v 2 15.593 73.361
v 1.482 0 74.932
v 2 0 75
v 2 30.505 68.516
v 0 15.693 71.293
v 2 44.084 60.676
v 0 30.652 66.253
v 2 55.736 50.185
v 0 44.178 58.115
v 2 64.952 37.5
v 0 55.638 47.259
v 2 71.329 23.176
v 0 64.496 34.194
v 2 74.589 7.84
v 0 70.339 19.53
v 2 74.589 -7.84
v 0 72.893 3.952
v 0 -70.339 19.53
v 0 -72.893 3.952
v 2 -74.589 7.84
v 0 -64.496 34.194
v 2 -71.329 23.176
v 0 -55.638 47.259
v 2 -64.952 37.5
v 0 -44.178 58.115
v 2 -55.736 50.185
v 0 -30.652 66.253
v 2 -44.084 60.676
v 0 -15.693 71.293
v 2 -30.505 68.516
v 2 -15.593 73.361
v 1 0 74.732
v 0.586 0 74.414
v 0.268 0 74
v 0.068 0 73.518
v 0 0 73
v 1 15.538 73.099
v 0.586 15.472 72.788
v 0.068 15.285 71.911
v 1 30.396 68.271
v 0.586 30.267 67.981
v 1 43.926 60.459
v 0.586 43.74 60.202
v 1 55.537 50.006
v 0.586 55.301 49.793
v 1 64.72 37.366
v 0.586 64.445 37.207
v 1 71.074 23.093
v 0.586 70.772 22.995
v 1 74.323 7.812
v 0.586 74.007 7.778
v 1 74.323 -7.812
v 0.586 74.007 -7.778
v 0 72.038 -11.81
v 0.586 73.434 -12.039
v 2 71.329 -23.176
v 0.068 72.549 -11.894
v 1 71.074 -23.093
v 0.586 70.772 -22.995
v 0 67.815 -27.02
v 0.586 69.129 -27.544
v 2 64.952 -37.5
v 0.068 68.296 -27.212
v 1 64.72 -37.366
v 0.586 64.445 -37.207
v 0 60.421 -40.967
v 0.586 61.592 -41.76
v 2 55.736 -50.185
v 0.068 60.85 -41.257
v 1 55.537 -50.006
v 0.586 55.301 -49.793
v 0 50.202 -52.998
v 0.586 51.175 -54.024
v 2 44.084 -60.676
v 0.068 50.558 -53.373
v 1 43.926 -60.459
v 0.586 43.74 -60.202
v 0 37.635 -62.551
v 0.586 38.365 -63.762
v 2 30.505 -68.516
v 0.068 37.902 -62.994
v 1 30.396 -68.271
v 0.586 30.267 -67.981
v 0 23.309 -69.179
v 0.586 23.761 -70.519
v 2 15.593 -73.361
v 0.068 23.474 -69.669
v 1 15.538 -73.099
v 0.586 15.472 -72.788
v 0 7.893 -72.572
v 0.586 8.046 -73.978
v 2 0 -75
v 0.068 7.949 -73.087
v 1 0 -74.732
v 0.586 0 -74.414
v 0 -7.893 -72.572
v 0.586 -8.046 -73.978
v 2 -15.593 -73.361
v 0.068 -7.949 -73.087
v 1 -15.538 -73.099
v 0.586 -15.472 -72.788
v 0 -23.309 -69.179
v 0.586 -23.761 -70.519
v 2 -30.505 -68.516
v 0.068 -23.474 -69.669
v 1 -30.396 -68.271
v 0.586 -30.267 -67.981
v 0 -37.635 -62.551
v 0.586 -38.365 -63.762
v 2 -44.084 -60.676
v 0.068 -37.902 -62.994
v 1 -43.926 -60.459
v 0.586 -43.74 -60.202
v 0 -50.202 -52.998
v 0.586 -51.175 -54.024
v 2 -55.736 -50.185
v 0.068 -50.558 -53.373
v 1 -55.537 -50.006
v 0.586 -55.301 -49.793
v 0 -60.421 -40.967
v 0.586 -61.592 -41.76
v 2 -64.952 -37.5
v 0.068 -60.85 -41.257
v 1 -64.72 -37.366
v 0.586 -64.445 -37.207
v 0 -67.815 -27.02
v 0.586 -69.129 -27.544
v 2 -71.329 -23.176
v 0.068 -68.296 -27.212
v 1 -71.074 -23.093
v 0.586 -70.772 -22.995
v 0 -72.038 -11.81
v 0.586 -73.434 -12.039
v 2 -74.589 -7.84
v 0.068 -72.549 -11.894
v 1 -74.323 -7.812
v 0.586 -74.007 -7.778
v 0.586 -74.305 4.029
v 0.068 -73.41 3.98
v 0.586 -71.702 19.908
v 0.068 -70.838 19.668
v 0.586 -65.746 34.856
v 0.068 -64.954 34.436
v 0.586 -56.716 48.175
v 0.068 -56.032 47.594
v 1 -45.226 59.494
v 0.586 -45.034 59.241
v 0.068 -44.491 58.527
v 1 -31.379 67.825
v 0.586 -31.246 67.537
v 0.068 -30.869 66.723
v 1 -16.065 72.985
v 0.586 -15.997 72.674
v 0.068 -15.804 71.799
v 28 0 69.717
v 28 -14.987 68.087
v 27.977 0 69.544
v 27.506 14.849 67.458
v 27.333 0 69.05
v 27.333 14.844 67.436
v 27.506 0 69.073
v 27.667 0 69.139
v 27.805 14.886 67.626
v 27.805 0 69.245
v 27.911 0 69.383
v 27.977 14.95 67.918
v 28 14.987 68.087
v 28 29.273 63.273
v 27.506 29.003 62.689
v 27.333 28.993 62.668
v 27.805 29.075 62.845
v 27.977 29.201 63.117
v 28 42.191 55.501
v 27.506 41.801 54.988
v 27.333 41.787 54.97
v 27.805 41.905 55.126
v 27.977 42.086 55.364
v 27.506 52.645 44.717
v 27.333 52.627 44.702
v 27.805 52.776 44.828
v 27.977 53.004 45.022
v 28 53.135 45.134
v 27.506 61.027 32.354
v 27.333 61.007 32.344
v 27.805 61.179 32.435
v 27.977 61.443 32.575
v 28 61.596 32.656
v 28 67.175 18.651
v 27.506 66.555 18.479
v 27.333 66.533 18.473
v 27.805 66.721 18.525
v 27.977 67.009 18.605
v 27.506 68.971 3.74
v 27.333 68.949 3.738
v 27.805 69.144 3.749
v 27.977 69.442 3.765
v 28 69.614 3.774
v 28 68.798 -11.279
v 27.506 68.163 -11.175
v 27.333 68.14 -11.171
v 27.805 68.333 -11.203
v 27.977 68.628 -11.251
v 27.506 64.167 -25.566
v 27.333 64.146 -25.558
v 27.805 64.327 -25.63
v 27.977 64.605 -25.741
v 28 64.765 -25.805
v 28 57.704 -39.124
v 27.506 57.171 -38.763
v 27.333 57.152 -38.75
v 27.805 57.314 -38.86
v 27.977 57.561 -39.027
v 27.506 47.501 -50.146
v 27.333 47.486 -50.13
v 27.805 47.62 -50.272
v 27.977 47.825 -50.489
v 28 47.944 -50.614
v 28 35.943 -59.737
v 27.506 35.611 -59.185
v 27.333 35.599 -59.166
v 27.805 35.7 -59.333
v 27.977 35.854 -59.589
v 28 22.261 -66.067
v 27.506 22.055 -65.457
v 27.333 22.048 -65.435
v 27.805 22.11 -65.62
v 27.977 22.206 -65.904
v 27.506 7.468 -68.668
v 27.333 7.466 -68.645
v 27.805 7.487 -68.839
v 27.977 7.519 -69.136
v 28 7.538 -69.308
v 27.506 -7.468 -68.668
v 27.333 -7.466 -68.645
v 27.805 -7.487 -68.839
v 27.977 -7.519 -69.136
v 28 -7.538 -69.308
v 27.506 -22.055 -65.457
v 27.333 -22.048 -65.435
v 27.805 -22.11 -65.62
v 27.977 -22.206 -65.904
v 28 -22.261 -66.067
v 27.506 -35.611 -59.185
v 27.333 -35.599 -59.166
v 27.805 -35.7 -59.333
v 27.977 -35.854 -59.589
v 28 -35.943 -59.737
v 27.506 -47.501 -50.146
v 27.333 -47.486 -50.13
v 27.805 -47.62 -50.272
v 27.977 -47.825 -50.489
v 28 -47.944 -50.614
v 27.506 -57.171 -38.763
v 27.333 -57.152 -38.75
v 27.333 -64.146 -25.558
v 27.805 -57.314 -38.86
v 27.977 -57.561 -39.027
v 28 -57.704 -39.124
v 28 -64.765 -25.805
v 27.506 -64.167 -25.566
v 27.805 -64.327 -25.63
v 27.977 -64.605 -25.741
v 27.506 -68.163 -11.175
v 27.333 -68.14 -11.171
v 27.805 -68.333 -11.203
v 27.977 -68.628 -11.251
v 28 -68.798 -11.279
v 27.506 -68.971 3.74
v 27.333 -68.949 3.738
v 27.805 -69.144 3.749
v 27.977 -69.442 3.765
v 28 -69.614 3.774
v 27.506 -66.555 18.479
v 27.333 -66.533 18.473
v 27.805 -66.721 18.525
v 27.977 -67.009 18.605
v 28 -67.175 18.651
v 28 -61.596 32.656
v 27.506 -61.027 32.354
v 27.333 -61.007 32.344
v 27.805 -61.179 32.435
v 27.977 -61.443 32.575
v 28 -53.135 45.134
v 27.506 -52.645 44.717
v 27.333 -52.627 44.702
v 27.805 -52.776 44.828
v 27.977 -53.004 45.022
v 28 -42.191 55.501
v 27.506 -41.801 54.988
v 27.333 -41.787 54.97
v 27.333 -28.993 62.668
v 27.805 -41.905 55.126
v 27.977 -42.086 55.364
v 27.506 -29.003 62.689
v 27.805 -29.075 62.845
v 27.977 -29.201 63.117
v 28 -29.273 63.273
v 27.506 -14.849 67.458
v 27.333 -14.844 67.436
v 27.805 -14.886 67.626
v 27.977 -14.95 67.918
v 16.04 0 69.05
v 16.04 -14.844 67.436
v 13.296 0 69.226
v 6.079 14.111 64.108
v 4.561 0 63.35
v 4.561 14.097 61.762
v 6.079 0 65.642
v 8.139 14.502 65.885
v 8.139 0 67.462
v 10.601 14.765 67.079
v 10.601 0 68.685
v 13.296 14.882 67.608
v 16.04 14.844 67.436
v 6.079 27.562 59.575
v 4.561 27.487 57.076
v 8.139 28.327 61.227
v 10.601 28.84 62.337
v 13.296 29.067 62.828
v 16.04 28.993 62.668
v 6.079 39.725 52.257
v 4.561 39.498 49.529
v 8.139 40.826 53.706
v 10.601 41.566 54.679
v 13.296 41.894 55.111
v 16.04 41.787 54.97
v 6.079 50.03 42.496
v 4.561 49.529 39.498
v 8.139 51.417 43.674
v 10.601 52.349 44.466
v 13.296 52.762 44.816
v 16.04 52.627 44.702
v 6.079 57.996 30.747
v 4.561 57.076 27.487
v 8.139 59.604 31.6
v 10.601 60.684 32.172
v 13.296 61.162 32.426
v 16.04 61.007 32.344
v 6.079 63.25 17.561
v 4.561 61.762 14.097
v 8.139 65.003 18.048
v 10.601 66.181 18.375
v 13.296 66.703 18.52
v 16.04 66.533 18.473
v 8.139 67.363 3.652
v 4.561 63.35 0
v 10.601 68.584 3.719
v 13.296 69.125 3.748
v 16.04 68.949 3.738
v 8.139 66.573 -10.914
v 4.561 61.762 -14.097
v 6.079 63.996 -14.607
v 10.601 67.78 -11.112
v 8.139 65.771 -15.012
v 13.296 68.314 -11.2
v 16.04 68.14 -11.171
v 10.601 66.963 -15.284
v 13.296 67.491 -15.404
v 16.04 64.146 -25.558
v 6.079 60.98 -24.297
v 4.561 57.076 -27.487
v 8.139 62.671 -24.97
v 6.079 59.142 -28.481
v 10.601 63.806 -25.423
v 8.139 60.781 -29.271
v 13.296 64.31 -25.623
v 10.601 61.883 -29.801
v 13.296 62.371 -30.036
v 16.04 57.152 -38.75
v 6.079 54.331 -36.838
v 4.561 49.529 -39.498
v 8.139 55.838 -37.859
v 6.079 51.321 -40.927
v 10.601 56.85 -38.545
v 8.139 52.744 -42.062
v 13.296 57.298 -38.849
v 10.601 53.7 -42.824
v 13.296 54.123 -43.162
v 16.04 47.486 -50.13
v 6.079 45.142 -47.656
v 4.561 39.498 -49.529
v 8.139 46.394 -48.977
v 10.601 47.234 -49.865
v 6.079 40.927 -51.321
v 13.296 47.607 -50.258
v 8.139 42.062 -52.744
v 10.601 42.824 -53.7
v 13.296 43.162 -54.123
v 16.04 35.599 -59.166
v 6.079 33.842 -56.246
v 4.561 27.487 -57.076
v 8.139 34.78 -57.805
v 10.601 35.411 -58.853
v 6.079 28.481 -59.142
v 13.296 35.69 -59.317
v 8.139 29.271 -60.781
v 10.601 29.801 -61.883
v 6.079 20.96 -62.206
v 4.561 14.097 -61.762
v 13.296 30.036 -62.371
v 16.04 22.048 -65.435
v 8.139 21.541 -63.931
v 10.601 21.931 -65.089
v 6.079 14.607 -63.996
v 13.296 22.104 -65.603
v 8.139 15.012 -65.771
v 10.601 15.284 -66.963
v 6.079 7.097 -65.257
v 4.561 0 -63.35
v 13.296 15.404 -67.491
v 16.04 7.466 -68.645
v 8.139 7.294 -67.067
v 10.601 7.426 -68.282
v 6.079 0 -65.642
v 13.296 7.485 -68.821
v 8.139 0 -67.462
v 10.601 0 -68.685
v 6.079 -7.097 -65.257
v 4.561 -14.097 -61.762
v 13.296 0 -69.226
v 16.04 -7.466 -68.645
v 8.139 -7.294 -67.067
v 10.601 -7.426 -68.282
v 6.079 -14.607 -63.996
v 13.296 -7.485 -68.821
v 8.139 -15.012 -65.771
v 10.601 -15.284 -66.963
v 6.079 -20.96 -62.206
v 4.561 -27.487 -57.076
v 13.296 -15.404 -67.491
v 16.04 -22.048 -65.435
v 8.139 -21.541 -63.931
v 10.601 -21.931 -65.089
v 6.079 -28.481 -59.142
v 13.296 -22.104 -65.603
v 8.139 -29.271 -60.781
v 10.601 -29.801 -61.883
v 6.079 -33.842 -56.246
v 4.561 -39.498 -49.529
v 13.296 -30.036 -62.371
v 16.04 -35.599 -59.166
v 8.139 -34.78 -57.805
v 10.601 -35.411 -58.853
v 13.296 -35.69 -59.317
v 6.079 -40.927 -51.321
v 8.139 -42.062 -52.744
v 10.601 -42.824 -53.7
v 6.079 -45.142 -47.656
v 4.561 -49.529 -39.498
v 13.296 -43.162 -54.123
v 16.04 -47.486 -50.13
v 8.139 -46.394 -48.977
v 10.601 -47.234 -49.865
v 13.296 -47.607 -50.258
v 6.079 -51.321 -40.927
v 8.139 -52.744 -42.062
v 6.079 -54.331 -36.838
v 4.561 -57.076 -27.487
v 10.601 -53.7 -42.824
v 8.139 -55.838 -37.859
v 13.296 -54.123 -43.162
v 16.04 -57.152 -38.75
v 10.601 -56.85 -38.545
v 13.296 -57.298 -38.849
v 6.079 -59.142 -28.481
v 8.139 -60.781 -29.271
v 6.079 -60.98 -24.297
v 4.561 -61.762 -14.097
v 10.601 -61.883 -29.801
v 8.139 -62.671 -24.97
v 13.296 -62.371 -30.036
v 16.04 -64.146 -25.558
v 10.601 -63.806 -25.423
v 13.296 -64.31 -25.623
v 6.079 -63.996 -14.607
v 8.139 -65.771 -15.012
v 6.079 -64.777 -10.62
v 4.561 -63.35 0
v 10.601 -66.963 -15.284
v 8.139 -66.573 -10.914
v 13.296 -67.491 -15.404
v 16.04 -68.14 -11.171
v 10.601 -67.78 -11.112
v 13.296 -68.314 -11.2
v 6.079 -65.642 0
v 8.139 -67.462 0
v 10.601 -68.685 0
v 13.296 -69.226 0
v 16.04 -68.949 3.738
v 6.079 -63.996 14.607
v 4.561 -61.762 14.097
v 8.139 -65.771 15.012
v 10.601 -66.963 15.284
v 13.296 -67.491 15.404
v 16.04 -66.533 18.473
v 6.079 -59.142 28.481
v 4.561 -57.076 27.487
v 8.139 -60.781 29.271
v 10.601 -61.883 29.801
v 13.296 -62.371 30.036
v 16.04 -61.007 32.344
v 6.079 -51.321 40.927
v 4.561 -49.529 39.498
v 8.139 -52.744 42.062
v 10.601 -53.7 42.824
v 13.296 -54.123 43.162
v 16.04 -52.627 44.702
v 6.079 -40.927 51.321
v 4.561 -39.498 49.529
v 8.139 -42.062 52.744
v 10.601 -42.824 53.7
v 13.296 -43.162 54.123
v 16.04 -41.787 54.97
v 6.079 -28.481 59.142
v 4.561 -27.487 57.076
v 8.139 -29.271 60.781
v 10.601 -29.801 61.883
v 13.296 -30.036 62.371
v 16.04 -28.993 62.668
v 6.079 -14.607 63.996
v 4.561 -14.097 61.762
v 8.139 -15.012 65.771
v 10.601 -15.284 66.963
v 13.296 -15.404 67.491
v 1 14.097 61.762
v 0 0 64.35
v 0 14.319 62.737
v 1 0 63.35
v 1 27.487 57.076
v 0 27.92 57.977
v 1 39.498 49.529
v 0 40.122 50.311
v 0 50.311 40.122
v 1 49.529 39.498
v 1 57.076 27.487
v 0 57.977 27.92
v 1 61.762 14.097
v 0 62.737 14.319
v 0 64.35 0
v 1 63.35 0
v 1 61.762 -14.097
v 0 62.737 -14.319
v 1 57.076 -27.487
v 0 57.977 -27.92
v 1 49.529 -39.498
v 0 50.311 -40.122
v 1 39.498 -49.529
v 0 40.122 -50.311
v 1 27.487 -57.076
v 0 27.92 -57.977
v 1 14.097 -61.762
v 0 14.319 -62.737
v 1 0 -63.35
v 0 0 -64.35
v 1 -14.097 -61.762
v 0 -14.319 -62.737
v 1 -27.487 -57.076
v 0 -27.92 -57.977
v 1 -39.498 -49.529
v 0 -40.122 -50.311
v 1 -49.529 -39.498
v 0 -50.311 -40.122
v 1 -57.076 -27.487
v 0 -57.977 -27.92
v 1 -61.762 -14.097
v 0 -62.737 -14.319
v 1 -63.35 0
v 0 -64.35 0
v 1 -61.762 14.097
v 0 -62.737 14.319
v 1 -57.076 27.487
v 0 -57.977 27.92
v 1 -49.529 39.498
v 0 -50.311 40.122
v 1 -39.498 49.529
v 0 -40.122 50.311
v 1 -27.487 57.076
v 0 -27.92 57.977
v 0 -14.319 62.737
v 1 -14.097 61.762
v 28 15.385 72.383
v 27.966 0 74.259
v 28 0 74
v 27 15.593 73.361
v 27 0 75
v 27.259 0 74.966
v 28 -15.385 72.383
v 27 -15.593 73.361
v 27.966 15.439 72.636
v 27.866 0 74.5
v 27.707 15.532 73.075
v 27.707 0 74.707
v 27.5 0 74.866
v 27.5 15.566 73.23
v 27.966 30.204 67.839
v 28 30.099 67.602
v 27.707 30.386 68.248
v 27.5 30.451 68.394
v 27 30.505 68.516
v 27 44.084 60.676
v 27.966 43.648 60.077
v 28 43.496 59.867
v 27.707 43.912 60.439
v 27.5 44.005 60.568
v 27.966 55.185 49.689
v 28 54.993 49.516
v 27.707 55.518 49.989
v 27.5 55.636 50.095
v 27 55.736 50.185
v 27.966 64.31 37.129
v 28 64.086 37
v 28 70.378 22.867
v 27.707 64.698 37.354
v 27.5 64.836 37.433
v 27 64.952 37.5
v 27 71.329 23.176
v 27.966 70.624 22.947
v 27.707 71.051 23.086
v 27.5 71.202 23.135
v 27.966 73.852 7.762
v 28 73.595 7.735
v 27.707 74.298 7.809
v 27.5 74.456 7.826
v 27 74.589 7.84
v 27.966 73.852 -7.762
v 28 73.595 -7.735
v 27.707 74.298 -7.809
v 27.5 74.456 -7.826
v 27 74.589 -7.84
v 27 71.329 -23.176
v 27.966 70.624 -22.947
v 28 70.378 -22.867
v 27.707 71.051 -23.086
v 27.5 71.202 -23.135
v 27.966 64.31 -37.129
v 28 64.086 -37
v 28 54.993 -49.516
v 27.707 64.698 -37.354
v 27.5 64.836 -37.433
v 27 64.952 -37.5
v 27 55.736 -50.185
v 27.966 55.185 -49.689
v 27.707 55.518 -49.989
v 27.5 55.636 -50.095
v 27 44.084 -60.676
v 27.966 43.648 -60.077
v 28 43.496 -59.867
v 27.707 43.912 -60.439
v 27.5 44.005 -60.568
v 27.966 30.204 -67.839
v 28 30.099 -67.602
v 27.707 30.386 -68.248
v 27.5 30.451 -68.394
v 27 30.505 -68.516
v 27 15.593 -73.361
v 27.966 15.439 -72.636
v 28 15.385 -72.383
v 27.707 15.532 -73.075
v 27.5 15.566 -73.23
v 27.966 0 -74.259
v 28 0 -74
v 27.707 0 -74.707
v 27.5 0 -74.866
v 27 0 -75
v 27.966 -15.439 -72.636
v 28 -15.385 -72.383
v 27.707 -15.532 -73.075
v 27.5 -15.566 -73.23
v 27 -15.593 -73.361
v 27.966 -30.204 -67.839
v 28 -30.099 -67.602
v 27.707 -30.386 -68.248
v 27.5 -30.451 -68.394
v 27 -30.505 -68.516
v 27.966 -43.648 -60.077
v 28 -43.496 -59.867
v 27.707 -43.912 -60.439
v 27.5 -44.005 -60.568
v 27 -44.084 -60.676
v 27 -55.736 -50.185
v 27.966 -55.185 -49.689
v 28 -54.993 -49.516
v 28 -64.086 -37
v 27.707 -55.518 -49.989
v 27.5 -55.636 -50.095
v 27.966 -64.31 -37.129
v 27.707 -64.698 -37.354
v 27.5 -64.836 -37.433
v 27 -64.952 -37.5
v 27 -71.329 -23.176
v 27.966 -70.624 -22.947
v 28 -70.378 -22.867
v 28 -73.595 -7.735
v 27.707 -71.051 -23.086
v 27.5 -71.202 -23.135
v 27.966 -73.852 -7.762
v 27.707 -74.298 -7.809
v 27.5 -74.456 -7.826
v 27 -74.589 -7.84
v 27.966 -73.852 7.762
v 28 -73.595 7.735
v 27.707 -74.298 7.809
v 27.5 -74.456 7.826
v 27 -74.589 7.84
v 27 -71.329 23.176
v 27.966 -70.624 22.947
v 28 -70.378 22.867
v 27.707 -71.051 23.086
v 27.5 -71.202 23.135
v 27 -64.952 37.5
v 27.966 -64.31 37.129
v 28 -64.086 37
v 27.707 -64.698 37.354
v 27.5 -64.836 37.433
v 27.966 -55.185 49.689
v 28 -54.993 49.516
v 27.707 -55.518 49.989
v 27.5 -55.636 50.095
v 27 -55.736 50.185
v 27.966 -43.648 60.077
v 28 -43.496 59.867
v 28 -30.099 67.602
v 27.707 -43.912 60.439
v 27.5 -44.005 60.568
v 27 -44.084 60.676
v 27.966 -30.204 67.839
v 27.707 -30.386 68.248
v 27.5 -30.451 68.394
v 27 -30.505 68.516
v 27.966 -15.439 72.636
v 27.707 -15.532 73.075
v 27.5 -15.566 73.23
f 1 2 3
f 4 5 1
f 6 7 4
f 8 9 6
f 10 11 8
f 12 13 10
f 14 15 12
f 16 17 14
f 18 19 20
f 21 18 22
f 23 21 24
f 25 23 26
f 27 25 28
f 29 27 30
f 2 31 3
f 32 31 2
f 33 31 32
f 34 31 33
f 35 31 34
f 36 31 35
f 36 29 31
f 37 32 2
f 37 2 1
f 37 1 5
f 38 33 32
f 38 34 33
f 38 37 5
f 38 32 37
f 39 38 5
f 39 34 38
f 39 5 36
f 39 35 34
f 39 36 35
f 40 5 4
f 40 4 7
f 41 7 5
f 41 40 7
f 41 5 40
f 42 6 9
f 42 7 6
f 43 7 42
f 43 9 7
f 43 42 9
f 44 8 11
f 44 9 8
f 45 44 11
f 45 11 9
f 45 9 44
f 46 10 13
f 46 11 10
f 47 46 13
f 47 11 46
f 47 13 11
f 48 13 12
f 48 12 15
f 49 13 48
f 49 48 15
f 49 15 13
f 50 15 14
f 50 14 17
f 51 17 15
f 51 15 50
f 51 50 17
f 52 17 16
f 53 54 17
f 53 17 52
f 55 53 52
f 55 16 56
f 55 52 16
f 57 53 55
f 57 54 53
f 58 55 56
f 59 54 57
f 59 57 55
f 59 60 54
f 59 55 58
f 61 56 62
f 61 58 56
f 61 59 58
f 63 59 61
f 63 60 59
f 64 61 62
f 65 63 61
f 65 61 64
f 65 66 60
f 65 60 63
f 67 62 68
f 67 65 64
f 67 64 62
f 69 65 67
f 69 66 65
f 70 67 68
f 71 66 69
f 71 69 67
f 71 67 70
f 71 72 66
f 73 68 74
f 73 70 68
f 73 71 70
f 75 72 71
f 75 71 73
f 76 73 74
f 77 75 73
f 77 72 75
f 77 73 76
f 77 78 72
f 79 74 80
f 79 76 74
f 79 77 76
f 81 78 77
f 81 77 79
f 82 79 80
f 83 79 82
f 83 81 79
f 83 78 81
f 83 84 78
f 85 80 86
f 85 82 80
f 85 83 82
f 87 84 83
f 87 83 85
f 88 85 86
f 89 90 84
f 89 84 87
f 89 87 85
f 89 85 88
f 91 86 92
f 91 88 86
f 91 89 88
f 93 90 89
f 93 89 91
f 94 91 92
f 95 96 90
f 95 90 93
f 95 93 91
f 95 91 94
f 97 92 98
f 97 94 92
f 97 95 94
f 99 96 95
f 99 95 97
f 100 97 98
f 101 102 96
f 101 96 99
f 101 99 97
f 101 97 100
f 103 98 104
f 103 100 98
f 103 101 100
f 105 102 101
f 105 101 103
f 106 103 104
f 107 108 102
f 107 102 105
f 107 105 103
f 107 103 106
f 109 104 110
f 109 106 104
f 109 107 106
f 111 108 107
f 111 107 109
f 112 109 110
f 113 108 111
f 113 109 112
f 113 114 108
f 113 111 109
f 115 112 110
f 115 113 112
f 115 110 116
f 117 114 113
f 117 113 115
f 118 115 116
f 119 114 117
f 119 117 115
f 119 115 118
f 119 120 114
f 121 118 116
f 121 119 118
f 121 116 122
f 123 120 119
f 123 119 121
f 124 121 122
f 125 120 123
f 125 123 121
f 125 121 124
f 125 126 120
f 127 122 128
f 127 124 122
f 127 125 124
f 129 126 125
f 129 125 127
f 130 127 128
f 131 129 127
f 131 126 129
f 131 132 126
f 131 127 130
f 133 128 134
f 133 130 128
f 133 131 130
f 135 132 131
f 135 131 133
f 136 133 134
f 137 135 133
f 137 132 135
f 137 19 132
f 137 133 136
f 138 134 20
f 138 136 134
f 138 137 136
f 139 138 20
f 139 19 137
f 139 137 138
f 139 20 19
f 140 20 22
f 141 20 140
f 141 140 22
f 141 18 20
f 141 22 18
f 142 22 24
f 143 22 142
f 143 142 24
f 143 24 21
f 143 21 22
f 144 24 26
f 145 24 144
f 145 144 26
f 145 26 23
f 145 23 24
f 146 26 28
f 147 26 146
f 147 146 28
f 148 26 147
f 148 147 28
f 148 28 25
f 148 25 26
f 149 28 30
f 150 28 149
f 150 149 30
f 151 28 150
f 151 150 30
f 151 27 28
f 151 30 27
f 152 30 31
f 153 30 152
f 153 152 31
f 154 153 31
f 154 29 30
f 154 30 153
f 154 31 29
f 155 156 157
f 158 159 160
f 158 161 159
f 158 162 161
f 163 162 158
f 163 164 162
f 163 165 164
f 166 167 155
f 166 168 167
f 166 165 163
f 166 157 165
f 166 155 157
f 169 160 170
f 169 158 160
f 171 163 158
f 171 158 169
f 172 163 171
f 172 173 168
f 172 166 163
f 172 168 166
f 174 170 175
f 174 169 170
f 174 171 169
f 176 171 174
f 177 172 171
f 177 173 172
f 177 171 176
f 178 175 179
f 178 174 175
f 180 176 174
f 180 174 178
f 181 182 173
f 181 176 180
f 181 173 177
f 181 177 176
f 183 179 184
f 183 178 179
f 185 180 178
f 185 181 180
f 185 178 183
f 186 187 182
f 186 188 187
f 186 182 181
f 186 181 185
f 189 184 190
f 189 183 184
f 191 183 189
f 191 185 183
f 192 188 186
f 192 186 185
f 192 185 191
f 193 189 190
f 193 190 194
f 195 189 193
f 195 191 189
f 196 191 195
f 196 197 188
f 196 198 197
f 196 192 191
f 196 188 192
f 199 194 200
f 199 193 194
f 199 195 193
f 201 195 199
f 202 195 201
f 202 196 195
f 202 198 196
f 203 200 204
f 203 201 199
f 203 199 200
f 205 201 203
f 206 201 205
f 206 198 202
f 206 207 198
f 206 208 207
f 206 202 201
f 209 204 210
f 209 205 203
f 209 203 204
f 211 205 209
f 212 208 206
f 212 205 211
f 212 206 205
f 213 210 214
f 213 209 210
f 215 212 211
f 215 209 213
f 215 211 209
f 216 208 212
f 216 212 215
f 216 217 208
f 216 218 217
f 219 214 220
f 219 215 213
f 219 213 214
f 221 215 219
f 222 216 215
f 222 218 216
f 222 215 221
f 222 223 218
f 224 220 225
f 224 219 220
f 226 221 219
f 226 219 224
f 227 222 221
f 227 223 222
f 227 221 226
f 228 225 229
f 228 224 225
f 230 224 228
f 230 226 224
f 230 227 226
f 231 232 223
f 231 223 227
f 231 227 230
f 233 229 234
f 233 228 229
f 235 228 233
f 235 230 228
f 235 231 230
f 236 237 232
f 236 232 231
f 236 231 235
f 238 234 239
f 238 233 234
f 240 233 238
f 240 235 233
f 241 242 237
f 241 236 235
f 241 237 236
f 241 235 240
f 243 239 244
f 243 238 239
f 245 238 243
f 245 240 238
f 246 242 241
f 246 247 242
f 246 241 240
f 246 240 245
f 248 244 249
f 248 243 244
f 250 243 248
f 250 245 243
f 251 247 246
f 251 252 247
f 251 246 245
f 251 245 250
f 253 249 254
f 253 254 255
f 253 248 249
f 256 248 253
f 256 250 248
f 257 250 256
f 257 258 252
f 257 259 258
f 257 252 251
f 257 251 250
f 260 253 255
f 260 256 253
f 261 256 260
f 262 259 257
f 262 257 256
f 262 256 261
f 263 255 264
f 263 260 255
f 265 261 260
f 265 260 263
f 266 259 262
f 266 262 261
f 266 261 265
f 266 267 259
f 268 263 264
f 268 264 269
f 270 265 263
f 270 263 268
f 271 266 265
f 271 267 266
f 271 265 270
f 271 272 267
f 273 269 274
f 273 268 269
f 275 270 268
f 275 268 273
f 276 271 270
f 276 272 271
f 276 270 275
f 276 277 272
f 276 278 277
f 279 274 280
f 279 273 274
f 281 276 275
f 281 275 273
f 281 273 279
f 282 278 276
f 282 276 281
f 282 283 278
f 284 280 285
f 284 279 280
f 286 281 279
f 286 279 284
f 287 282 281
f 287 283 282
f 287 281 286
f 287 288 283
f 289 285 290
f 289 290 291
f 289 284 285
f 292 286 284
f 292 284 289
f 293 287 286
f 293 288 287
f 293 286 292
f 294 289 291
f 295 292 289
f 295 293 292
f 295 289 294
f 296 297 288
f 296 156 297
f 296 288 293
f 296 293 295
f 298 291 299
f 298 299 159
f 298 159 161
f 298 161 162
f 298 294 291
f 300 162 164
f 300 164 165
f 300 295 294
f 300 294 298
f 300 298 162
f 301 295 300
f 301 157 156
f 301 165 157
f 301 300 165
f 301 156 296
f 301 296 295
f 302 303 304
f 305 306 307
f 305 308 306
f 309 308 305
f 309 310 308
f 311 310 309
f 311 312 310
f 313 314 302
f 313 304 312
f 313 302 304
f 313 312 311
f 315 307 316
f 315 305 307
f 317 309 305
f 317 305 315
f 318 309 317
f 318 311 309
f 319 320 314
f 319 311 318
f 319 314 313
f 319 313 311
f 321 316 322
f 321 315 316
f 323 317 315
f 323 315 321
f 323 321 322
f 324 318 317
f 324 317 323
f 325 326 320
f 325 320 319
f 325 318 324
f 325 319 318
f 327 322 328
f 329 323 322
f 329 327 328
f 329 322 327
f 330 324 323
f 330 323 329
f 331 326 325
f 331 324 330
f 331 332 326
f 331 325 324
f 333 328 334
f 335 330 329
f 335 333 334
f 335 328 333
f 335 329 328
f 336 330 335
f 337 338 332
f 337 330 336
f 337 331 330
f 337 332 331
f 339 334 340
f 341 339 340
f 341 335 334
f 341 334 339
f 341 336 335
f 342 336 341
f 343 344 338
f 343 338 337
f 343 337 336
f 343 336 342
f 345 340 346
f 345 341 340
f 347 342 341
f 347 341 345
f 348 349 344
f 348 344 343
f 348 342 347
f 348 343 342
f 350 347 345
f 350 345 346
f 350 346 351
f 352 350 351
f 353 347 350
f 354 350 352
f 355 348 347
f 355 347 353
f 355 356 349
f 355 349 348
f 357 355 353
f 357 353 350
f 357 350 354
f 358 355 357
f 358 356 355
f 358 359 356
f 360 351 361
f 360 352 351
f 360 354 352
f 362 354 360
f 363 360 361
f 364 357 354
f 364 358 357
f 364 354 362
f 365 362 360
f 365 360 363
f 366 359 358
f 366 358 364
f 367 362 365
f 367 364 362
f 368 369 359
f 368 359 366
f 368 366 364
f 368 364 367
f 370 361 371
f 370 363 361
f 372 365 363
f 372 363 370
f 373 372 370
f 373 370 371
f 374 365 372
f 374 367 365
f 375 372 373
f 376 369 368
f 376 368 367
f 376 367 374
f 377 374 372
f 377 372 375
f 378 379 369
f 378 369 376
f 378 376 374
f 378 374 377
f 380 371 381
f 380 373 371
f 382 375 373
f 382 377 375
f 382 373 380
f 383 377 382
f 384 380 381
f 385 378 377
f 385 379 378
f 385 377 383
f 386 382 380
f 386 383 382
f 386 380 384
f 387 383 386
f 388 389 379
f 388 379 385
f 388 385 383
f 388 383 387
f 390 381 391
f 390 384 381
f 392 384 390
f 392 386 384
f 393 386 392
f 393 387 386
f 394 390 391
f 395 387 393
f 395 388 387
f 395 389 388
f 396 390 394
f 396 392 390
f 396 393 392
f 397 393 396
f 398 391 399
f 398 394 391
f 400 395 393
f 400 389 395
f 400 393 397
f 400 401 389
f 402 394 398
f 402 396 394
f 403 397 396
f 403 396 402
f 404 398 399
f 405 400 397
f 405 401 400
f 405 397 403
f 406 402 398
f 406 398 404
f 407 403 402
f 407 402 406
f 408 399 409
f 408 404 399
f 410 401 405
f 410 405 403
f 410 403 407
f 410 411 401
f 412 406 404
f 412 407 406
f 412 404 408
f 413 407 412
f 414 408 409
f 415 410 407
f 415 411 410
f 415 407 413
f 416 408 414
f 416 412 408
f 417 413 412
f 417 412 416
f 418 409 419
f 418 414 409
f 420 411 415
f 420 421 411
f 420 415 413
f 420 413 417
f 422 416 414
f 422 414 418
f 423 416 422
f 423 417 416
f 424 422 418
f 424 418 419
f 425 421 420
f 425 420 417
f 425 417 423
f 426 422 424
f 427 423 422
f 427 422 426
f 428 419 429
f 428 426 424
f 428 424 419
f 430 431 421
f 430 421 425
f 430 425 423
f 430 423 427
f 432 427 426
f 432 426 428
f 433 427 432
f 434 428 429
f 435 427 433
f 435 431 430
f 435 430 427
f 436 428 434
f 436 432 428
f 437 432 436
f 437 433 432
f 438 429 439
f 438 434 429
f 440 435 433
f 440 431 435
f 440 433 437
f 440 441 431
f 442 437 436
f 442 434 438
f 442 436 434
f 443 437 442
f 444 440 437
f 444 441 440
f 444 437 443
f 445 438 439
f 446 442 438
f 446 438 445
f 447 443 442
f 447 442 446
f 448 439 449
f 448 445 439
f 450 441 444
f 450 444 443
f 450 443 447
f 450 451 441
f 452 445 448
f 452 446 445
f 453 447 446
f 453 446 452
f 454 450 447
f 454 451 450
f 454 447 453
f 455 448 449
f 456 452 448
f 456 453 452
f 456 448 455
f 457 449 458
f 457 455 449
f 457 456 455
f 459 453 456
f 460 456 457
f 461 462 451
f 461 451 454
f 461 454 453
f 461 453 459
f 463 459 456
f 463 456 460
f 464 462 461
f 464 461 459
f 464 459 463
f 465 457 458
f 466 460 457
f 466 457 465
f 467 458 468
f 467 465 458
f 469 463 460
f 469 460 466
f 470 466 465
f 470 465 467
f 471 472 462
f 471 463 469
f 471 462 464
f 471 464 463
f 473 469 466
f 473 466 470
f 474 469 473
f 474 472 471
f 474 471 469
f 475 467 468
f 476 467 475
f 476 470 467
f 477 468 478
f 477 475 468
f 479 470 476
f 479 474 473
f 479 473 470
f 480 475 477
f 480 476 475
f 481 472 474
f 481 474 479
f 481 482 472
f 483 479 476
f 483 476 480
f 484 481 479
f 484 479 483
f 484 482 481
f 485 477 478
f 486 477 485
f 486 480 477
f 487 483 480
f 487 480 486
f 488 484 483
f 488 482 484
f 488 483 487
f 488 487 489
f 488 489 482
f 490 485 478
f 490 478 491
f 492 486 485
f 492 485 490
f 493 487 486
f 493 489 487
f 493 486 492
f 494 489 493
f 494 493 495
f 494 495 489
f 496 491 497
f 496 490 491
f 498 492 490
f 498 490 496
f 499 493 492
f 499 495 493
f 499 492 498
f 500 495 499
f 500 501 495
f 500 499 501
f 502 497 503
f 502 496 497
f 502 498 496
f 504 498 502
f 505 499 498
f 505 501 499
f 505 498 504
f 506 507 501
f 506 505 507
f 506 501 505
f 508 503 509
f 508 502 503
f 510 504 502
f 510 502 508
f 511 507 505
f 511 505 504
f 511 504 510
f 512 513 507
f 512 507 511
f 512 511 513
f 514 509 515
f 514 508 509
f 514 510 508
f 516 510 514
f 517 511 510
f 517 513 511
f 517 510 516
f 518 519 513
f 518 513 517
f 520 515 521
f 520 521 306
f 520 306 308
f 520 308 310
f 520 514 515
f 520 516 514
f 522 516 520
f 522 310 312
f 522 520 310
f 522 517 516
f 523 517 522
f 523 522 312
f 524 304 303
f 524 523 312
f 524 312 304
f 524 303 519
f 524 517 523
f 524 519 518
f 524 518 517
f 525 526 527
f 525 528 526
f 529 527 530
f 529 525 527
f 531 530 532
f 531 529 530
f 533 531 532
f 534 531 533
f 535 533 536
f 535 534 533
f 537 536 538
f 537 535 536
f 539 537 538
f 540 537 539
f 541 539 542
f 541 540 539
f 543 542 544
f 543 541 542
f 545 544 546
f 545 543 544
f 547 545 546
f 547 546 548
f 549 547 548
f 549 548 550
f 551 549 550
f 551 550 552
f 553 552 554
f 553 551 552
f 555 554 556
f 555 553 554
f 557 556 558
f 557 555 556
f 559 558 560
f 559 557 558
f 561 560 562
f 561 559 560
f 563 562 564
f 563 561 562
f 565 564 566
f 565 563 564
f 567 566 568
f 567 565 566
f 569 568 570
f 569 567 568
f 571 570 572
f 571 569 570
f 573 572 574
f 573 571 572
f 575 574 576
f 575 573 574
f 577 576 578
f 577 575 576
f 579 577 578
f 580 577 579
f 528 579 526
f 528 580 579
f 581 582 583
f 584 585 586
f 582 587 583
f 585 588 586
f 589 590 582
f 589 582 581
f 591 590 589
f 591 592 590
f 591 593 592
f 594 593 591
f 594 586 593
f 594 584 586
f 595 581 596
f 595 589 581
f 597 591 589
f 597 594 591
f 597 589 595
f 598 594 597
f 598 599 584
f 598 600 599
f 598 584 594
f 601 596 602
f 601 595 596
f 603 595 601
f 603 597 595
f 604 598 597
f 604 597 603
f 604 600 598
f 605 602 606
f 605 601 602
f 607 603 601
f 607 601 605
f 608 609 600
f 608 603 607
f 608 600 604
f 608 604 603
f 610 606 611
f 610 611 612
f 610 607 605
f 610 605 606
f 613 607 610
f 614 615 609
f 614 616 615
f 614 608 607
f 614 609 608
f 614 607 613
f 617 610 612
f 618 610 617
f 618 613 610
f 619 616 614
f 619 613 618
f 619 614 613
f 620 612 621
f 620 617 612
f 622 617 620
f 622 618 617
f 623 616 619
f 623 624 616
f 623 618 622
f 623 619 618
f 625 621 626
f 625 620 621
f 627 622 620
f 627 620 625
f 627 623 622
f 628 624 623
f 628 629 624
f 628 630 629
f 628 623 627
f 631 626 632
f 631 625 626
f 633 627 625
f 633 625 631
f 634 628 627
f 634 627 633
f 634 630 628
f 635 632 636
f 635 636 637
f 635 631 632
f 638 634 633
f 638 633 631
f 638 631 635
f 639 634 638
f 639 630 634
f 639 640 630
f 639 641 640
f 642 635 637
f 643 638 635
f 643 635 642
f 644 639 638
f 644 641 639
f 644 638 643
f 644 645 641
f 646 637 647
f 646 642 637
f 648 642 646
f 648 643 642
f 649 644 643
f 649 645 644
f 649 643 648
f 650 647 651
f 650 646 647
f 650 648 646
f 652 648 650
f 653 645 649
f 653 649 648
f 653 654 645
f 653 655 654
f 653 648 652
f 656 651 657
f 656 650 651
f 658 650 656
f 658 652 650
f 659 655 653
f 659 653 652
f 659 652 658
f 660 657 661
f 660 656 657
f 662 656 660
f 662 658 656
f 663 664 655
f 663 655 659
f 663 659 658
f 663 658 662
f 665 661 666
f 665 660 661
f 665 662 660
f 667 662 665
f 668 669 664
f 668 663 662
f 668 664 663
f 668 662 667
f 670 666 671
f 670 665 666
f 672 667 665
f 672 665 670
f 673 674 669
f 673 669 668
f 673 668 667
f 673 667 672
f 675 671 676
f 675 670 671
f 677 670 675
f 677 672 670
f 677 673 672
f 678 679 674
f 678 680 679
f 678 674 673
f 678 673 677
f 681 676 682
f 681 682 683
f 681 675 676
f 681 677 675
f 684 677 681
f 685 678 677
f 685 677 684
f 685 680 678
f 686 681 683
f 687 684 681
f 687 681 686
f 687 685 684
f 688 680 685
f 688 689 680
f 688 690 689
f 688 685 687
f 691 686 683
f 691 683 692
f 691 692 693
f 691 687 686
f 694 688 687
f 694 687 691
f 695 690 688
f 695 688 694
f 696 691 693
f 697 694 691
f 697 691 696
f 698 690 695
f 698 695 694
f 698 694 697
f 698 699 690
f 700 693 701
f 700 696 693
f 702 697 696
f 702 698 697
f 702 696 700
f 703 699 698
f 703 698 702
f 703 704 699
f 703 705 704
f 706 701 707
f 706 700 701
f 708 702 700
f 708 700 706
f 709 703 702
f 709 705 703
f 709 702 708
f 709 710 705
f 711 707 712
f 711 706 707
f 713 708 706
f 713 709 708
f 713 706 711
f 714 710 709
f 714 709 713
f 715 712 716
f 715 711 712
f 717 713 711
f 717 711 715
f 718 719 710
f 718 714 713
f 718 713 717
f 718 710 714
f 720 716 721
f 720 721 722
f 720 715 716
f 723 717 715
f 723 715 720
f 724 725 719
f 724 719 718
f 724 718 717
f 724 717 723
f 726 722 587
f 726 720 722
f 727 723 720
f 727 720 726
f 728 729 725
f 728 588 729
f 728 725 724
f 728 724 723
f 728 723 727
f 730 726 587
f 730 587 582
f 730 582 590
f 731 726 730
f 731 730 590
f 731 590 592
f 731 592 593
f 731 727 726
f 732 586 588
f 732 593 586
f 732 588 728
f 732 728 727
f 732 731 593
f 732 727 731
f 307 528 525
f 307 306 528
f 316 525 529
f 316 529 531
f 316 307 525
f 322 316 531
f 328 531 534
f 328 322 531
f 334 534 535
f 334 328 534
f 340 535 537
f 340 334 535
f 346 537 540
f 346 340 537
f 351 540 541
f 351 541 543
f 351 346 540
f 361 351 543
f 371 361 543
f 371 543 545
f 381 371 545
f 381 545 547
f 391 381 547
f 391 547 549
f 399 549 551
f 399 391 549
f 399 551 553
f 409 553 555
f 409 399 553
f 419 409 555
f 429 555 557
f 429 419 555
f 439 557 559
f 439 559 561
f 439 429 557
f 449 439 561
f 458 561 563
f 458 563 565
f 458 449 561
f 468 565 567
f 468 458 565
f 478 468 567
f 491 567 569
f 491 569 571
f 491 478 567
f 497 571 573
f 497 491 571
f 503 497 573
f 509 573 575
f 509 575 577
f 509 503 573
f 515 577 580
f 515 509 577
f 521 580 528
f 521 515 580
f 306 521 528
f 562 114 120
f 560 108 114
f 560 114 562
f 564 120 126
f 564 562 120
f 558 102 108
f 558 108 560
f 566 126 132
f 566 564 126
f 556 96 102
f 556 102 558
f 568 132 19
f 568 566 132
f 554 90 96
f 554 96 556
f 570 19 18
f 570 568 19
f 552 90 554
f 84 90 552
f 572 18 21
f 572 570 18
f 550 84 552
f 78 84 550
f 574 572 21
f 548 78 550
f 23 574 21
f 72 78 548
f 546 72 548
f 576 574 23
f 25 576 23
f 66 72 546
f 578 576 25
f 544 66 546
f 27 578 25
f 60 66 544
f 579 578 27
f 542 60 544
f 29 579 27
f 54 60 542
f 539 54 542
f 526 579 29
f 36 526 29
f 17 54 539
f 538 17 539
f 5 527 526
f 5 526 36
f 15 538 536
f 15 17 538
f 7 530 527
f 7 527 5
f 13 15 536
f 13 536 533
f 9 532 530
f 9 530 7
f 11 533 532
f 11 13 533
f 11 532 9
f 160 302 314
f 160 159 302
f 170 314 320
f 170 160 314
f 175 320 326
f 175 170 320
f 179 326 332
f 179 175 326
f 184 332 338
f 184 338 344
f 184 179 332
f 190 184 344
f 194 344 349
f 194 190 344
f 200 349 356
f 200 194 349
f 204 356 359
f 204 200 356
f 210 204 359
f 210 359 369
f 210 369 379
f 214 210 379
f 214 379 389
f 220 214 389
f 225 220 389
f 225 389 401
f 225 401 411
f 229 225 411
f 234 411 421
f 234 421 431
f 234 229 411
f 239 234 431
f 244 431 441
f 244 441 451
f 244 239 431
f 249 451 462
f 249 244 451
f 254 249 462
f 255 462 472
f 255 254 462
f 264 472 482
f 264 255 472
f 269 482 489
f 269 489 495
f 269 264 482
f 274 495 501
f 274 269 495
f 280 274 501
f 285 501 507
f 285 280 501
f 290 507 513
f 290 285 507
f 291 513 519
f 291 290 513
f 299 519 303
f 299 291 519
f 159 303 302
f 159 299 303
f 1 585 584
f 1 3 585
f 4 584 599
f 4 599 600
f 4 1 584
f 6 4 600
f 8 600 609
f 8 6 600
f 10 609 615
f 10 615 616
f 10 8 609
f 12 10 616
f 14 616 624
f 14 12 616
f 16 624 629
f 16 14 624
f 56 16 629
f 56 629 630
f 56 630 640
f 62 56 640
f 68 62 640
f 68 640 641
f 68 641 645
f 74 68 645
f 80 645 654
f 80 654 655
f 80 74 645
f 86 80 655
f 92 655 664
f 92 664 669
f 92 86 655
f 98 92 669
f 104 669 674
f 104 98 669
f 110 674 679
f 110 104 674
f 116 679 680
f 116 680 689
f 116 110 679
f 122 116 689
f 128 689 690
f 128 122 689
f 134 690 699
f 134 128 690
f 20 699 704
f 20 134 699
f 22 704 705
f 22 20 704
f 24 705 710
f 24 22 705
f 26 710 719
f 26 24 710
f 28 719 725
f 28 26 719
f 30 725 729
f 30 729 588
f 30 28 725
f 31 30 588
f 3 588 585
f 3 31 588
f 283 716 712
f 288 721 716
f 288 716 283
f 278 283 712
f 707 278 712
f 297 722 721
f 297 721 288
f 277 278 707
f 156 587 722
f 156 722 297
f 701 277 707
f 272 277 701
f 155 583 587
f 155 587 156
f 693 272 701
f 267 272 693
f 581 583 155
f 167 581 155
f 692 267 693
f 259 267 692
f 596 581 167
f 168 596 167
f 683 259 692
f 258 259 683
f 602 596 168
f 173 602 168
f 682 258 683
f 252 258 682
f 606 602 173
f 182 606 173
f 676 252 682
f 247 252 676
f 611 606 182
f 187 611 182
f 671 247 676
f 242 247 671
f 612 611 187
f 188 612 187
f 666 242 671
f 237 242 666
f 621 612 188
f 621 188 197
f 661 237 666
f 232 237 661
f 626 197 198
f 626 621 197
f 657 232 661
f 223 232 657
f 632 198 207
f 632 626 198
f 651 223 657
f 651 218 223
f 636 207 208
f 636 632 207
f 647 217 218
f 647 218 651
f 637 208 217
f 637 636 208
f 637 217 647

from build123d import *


with BuildPart() as part:
    # Schizzo1 → Rivoluzione1 (revolve)
    with BuildSketch(Plane.XY, mode=Mode.PRIVATE) as rivoluzione1_sk:
        with BuildLine():
            Line((0, 64.35), (1, 63.35))
            Line((1, 63.35), (4.561250083, 63.35))
            ThreePointArc((4.561250083, 63.35), (9.32995439, 68.154290191), (16.039607805, 69.05))
            Line((16.039607805, 69.05), (27.333333333, 69.05))
            ThreePointArc((27.333333333, 69.05), (27.804737854, 69.245262146), (28, 69.716666667))
            Line((28, 69.716666667), (28, 74))
            ThreePointArc((28, 74), (27.707106781, 74.707106781), (27, 75))
            Line((27, 75), (2, 75))
            ThreePointArc((2, 75), (0.585786438, 74.414213562), (0, 73))
            Line((0, 73), (0, 64.35))
        make_face()
    revolve(rivoluzione1_sk.sketch.rotate(Axis((28, 0, 0), (-1, 0, 0)), 270), axis=Axis((28, 0, 0), (-1, 0, 0)))


solid = part.part
